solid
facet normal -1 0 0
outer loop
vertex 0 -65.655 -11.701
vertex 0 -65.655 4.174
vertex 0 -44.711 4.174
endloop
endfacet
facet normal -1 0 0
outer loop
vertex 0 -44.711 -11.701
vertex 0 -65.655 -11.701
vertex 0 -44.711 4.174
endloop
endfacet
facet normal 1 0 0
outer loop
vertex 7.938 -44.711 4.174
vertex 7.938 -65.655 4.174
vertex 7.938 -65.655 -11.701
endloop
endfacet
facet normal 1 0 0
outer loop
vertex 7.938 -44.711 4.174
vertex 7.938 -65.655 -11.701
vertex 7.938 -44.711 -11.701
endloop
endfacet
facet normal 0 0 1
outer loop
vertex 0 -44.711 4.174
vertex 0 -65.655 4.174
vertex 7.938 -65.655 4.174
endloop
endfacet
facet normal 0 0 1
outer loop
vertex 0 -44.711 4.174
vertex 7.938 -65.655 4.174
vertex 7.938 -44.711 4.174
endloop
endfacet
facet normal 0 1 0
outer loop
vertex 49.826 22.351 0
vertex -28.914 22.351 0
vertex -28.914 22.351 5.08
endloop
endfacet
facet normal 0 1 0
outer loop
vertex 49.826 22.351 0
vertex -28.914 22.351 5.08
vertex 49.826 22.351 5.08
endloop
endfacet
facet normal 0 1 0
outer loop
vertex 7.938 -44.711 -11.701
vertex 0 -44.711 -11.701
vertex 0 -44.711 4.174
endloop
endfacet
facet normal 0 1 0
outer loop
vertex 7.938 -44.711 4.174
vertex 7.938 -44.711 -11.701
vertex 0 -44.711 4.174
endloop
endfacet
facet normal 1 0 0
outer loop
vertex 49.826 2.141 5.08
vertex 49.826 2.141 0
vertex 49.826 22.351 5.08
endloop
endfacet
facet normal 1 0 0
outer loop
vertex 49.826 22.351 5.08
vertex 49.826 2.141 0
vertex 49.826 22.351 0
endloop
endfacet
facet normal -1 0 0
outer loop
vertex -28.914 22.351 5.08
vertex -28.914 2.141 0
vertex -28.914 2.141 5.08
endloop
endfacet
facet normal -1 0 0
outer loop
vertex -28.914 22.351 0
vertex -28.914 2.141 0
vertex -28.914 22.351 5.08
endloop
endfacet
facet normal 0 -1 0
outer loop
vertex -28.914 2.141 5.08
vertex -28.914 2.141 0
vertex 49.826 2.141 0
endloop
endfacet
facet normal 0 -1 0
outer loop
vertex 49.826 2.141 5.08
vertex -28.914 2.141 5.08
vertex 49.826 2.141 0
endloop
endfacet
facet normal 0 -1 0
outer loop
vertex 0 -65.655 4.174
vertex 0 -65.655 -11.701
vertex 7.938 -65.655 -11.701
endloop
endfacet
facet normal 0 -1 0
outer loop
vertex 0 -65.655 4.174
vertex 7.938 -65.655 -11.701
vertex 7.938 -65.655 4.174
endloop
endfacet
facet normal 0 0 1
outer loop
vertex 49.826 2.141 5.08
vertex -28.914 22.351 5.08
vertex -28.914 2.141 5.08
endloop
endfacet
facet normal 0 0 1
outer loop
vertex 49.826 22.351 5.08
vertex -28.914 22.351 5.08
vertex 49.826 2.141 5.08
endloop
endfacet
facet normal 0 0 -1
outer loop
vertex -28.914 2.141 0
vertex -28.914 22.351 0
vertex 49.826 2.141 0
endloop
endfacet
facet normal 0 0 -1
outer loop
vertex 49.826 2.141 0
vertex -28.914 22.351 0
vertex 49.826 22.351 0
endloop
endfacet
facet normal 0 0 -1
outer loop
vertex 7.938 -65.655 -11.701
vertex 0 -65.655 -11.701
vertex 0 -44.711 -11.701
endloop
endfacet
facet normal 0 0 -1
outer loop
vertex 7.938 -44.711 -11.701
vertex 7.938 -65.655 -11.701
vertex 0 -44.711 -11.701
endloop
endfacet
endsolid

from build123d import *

# Parameters (mm, degrees)
F0_W     = 20.9442564005
F0_H     = 15.875
F1_DEPTH = 7.9375
F3_W     = 78.74
F3_H     = 20.2099310613
F4_DEPTH = 5.08


# Not quite as in the source:
# - the program builds the solid bodies; features that only make, move or delete a surface that nothing else refers to are left out


with BuildPart() as f1:
    # F0 (on Right) → F1 (new body)
    with BuildSketch(Plane.YZ):
        with Locations((-55.1829777162, -3.7632510066)):
            Rectangle(F0_W, F0_H)
    extrude(amount=F1_DEPTH)


with BuildPart() as f4:
    # F3 (on Top) → F4 (new body)
    with BuildSketch(Plane.XY):
        with Locations((10.4557741433, 12.2460403945)):
            Rectangle(F3_W, F3_H)
    extrude(amount=F4_DEPTH)


solid = Compound([f1.part, f4.part])
